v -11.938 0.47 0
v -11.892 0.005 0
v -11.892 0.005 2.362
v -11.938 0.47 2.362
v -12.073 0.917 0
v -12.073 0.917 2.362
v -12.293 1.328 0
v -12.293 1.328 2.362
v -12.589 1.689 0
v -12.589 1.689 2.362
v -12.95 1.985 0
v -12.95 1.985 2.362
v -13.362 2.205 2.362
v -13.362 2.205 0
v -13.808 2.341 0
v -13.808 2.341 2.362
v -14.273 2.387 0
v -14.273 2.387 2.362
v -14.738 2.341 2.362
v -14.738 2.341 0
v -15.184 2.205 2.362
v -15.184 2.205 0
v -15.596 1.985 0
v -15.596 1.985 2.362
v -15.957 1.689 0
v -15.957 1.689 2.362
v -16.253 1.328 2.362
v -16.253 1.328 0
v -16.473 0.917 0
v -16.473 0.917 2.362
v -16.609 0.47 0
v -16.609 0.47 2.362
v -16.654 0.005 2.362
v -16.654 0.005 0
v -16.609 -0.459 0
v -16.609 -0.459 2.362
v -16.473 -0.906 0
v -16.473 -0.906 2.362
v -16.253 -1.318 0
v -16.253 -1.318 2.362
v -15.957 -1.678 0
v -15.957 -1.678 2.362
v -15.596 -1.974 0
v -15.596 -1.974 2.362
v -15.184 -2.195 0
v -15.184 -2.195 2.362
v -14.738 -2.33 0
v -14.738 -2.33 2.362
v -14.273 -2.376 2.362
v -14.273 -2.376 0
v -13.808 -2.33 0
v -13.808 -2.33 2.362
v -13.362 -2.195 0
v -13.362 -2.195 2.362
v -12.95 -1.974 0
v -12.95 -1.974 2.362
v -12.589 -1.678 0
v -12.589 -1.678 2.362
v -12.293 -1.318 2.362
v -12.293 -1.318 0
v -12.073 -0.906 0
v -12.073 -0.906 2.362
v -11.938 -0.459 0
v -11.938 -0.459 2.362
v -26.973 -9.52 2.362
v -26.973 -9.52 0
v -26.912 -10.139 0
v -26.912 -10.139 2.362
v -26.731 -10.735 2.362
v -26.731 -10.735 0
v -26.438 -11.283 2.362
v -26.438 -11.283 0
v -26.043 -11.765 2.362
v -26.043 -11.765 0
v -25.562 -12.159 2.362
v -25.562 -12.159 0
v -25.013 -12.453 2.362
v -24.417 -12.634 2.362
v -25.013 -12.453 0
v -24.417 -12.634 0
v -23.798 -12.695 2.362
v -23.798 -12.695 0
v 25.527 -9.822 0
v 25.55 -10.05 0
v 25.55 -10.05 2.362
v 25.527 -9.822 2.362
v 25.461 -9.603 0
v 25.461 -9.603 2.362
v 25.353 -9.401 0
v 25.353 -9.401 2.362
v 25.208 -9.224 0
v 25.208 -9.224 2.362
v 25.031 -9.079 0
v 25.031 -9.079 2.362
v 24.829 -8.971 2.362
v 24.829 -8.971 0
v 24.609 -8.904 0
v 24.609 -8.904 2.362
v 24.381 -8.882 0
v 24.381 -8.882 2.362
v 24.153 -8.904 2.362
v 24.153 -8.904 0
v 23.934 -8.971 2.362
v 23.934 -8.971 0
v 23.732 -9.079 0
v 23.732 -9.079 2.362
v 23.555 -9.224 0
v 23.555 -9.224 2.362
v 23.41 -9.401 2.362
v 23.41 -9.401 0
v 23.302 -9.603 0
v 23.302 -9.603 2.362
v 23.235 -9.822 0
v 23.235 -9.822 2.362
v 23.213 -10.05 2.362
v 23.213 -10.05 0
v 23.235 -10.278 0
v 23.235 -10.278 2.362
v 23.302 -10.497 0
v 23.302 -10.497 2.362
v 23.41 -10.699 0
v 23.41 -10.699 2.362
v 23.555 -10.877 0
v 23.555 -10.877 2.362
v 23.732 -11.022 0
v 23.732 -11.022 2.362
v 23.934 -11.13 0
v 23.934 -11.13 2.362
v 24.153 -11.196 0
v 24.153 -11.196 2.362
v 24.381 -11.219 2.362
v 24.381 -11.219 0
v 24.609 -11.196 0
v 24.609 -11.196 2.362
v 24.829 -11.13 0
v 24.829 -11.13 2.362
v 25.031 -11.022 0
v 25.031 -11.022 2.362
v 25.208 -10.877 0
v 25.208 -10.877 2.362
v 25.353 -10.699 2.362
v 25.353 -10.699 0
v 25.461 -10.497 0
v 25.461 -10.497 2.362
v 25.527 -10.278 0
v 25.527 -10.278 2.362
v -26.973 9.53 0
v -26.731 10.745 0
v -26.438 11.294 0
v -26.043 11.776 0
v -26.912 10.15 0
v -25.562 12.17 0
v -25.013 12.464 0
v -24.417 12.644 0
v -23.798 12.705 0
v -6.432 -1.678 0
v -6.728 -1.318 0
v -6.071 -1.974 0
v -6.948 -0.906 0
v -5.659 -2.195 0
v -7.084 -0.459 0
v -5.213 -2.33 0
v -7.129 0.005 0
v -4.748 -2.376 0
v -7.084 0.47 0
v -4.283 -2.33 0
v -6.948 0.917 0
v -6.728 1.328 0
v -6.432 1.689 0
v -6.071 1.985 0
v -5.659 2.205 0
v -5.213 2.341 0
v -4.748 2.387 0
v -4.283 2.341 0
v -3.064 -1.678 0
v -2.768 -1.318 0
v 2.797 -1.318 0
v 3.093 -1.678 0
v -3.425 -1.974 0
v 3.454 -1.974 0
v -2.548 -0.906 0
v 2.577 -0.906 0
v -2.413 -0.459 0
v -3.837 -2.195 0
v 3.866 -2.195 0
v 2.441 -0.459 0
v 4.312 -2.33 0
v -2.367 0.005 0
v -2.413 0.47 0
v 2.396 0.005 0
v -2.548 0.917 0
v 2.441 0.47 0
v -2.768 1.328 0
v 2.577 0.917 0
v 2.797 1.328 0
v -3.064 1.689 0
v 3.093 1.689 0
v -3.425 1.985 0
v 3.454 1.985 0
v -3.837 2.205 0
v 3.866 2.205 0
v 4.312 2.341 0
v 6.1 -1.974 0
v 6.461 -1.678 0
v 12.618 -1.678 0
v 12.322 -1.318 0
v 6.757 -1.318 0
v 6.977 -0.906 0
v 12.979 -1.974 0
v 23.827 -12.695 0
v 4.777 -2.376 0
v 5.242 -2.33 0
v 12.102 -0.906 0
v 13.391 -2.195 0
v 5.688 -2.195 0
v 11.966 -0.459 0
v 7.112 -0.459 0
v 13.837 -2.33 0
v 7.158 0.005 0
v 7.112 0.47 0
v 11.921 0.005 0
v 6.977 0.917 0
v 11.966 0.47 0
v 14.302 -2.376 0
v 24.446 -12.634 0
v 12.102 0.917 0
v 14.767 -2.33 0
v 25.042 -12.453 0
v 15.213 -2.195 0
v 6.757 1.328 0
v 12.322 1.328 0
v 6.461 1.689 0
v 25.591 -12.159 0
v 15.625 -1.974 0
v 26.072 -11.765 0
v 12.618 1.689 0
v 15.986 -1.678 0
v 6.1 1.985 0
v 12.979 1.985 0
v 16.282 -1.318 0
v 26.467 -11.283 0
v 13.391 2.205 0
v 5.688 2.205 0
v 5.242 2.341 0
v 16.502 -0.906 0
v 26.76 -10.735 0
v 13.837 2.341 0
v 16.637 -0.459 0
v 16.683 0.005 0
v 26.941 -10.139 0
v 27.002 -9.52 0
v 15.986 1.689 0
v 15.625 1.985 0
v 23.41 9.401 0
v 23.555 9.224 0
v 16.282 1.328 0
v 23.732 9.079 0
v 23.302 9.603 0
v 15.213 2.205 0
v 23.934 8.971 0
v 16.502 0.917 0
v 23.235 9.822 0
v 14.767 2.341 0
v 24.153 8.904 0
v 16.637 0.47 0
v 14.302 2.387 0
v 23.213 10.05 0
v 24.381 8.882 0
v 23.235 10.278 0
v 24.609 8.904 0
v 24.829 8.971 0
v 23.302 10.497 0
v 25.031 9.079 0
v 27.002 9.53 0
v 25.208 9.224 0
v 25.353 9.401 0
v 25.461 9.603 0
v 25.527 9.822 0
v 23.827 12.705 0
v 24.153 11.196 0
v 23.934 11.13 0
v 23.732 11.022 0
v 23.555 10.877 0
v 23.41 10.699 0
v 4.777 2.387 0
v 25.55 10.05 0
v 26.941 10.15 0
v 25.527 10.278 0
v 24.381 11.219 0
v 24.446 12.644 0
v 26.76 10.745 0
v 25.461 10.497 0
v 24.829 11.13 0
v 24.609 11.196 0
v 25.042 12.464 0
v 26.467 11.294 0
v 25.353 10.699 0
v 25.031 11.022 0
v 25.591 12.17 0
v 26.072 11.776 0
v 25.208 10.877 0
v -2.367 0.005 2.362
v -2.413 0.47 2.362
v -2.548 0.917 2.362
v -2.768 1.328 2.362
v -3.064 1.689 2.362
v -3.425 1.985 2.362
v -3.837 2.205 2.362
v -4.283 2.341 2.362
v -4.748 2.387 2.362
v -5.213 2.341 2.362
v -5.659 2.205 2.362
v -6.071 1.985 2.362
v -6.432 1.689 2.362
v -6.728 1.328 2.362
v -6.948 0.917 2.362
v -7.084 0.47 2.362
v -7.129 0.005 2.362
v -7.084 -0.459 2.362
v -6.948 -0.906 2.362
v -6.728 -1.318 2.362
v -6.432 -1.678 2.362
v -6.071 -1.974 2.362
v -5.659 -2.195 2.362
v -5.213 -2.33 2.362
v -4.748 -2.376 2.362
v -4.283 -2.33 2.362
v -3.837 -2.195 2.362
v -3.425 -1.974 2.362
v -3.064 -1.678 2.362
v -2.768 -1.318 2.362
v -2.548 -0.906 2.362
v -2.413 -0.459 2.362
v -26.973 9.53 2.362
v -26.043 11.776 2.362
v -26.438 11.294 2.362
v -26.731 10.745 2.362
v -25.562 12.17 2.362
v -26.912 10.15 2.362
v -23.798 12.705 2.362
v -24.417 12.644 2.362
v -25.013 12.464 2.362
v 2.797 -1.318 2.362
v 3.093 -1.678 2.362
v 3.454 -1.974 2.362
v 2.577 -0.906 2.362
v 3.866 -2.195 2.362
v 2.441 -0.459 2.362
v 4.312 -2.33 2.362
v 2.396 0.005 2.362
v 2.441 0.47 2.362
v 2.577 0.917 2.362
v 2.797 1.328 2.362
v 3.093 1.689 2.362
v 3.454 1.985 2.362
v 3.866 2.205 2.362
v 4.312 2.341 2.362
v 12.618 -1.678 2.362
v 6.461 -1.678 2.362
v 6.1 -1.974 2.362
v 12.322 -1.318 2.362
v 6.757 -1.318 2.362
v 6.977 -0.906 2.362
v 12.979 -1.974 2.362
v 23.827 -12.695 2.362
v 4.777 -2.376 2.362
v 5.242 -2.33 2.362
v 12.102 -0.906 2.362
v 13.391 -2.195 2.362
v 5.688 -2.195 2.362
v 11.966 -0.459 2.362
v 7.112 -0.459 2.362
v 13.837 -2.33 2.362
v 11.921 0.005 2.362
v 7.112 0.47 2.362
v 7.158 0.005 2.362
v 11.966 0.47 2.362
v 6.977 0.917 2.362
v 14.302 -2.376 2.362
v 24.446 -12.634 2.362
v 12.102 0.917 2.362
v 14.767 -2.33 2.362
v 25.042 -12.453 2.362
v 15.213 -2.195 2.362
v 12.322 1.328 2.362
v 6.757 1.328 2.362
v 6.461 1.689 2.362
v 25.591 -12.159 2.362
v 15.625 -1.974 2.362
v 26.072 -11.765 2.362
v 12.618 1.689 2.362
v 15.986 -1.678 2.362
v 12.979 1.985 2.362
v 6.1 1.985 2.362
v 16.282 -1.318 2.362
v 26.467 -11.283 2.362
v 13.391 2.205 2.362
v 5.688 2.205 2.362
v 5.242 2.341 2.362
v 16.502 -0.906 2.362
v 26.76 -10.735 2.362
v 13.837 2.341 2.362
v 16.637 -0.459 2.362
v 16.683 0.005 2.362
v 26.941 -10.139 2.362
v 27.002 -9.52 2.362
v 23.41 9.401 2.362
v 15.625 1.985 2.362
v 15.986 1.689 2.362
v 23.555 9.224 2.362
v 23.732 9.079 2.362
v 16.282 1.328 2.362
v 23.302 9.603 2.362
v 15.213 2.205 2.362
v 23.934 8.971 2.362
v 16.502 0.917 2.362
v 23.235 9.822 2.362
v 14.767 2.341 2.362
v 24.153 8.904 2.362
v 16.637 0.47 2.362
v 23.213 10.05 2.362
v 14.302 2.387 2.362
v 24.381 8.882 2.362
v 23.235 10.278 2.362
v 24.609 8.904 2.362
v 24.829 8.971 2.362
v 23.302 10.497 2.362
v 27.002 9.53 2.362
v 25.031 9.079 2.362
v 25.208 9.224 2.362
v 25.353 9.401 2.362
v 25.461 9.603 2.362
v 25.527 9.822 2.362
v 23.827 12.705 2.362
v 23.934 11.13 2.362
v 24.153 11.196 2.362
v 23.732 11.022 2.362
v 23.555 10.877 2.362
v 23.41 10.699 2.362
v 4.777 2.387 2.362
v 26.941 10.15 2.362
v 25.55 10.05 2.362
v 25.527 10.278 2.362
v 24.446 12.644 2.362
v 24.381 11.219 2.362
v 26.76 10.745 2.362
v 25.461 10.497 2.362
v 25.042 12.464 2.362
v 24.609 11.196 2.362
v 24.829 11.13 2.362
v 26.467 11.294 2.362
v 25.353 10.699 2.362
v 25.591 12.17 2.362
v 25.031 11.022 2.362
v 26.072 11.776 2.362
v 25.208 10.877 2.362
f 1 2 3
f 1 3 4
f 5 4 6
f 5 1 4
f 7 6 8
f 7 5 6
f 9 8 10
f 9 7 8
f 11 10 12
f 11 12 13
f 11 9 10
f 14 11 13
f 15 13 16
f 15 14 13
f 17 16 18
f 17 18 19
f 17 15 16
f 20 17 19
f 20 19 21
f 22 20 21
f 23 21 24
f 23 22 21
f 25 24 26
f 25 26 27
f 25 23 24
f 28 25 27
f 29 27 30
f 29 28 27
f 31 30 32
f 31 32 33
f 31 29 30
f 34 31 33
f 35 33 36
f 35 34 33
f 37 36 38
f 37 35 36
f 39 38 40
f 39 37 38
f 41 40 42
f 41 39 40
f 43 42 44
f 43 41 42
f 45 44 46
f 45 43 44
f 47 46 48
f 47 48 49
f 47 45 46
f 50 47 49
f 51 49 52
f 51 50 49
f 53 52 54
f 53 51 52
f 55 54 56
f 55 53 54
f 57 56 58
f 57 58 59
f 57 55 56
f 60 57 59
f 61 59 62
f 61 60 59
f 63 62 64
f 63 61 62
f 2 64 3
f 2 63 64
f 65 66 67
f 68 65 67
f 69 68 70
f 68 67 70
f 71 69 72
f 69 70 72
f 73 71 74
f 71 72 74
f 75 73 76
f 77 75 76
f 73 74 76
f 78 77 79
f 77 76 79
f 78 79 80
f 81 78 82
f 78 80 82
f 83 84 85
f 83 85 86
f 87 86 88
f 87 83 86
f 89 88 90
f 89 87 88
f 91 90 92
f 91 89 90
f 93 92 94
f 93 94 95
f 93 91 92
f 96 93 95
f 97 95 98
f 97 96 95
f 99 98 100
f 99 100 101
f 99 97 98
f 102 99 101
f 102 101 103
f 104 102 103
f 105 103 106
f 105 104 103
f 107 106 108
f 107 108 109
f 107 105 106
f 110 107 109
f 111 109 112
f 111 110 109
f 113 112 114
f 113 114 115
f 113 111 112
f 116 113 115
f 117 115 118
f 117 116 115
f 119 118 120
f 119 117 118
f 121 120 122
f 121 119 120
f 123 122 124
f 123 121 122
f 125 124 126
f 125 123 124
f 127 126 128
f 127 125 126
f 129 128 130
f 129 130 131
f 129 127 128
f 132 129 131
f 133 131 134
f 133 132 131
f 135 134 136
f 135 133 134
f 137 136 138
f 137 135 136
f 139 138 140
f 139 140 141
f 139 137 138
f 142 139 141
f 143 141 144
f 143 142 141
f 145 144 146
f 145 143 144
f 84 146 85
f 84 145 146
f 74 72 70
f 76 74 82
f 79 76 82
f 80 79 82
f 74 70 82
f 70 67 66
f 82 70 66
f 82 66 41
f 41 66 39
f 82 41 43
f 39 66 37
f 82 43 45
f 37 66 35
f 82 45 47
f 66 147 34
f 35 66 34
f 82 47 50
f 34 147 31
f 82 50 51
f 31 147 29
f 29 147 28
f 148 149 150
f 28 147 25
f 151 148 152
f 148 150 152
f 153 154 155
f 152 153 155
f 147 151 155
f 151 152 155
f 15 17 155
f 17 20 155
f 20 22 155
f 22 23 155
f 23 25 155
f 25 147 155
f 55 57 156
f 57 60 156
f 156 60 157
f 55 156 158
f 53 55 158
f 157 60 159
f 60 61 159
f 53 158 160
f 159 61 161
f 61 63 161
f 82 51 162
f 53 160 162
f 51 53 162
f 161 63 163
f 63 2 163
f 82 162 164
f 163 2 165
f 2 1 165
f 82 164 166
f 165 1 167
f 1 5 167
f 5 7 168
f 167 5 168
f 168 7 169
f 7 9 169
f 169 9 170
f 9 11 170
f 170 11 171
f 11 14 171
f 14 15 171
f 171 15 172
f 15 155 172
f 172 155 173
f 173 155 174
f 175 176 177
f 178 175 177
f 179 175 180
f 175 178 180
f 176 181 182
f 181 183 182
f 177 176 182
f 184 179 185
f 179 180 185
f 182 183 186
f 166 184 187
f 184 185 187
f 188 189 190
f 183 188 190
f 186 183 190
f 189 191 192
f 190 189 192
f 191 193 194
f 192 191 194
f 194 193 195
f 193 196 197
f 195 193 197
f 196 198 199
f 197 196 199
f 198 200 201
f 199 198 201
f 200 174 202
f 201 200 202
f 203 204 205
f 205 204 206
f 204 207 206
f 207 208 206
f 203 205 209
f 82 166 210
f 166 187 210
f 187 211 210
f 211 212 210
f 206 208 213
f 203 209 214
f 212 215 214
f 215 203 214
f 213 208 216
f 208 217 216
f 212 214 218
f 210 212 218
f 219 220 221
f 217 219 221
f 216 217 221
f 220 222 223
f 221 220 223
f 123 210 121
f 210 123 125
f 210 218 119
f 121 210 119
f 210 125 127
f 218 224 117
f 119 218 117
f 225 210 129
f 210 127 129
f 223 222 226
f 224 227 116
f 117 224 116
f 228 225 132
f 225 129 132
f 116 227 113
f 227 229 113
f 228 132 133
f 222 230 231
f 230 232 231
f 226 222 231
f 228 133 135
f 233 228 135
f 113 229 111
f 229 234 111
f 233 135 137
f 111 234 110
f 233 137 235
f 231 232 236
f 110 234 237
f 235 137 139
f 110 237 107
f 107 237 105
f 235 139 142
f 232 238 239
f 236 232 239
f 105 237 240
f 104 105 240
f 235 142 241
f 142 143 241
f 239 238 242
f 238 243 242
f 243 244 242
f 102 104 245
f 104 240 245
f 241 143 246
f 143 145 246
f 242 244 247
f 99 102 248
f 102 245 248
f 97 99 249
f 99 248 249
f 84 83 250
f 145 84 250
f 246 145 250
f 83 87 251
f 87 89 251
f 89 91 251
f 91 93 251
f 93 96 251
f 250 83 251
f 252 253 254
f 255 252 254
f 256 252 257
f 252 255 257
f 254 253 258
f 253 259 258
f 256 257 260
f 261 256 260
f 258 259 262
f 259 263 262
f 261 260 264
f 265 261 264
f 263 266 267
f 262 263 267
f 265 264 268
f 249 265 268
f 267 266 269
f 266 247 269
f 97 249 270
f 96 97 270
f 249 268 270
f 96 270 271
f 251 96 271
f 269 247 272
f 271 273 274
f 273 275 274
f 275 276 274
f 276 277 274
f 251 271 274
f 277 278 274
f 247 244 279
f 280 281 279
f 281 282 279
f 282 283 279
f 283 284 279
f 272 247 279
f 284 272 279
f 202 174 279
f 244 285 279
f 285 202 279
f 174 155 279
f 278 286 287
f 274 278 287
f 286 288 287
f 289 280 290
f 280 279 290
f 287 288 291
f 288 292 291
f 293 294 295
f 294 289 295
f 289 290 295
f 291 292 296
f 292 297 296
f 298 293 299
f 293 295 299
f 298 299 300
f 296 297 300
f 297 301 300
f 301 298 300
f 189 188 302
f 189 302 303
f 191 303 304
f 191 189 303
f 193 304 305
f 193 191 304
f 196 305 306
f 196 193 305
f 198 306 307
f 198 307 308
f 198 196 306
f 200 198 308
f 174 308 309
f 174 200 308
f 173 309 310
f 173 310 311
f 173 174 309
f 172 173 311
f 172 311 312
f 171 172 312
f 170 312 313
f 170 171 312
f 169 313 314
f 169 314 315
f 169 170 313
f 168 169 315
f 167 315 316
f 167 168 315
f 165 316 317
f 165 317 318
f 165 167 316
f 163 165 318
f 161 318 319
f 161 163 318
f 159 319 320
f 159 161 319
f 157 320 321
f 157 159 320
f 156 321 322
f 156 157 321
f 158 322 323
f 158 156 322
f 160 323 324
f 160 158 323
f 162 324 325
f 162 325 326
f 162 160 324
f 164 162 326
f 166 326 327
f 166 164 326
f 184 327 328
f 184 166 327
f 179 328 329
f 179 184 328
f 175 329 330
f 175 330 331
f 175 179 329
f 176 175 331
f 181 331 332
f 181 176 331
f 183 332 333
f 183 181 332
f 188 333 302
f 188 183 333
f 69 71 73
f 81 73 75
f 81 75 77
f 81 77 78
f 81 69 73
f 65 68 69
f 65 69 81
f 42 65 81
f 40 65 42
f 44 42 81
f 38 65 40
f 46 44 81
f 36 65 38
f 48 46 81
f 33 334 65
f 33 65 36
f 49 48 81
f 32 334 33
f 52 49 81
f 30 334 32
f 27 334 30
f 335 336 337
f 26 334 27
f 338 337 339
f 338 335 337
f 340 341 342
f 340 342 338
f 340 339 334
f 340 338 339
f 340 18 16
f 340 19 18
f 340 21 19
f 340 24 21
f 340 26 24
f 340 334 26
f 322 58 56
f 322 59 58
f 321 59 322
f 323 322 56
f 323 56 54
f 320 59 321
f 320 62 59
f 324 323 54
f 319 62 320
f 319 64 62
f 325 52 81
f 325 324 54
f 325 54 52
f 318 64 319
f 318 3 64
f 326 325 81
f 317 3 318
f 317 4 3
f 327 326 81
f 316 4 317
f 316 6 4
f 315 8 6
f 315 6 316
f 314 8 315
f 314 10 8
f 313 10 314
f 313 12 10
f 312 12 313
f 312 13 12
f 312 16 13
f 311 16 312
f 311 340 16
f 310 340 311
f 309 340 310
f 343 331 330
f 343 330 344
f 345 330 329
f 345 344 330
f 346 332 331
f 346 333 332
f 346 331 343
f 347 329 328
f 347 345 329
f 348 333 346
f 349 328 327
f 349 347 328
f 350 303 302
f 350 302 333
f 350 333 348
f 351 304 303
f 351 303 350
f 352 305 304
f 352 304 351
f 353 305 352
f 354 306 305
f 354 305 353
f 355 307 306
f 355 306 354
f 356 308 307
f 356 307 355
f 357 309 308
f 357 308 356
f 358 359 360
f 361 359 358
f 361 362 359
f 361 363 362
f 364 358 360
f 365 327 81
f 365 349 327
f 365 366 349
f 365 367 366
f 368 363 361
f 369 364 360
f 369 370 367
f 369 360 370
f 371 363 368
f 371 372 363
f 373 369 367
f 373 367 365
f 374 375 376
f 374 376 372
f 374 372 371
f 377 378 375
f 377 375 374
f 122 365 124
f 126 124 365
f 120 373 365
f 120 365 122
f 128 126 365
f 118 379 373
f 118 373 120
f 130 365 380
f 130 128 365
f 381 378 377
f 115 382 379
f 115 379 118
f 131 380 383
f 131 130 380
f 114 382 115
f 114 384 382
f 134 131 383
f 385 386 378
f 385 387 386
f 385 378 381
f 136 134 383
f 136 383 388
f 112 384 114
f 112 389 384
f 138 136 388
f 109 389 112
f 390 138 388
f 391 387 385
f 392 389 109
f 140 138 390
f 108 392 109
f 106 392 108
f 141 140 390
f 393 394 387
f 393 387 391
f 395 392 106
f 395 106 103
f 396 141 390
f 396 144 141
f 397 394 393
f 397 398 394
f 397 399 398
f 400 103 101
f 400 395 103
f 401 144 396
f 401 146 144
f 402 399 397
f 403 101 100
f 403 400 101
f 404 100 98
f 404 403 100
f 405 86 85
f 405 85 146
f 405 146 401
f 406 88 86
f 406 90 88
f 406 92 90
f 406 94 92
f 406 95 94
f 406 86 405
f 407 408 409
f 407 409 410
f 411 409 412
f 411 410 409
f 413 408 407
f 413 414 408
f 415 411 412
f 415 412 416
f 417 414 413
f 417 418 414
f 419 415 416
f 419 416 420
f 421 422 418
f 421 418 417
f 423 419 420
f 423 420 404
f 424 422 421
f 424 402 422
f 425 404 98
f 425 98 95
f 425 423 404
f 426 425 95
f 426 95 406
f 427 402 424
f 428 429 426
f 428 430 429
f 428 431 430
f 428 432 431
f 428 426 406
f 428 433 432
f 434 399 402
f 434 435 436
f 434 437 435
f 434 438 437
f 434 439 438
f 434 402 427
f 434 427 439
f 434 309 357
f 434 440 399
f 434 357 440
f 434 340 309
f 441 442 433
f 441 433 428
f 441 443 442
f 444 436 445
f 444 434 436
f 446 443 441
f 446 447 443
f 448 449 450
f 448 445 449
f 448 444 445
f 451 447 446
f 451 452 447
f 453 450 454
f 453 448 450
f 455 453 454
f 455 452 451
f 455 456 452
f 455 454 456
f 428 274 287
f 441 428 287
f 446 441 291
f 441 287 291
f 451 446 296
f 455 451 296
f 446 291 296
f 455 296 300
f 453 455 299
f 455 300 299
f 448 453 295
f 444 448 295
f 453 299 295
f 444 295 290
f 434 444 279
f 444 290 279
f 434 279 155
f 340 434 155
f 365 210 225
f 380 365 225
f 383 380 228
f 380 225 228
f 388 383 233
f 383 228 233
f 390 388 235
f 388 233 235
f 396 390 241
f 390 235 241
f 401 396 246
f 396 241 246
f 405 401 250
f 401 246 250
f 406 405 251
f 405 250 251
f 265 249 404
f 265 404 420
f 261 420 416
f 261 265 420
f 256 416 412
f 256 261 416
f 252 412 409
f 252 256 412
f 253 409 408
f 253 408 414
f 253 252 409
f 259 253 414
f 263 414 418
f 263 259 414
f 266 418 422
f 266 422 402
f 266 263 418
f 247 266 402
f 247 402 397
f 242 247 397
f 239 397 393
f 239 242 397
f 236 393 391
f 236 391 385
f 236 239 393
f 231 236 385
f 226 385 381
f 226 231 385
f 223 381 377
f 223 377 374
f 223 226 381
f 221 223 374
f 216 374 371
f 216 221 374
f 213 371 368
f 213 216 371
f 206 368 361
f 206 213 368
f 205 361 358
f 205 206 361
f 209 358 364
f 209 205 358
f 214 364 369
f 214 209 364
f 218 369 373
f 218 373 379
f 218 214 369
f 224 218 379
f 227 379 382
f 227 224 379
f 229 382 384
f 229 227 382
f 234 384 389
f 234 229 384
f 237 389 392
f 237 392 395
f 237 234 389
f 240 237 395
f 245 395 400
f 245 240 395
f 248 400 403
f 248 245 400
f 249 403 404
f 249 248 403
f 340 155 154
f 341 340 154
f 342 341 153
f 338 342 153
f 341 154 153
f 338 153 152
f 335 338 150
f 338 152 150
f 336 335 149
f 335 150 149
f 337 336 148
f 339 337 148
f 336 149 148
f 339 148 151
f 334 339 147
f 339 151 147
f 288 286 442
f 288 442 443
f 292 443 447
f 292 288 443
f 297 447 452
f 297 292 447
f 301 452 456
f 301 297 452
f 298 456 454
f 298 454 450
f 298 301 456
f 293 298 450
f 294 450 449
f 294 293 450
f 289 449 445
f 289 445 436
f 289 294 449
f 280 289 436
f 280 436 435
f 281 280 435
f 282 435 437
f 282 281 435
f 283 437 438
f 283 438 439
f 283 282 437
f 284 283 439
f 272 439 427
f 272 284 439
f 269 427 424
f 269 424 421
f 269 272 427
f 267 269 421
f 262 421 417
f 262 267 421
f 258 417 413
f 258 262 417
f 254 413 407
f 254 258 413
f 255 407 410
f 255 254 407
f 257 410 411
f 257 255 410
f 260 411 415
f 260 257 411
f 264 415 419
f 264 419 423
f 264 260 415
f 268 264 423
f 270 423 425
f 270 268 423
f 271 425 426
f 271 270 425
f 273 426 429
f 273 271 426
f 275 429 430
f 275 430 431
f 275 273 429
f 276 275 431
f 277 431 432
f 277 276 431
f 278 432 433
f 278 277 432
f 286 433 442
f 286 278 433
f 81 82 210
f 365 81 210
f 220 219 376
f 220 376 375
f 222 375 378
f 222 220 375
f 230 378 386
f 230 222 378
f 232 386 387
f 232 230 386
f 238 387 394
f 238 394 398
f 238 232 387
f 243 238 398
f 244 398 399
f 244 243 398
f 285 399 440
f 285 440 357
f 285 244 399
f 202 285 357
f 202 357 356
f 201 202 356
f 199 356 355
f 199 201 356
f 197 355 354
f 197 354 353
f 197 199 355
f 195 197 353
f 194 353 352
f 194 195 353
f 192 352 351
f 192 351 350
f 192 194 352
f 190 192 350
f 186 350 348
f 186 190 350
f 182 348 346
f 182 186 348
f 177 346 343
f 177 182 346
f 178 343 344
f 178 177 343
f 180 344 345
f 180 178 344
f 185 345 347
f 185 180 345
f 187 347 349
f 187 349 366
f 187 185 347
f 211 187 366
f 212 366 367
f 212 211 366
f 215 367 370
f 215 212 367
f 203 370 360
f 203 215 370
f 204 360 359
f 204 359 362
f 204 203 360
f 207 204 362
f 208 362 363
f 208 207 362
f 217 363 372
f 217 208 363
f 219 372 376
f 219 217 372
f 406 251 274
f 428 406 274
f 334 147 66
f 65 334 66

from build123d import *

# Parameters (mm, degrees)
F0_R     = 2.38125
F0_R_2   = 1.1684
F1_DEPTH = 2.3622


with BuildPart() as f1:
    # F0 (on Top) → F1 (new body)
    with BuildSketch(Plane.XY):
        with BuildLine():
            ThreePointArc((27.001965, 9.530442), (26.072029, 11.775506), (23.826965, 12.705442))
            Line((23.826965, 12.705442), (-23.798035, 12.705442))
            ThreePointArc((-23.798035, 12.705442), (-26.043099, 11.775506), (-26.973035, 9.530442))
            Line((-26.973035, 9.530442), (-26.973035, -9.519558))
            ThreePointArc((-26.973035, -9.519558), (-26.043099, -11.764622), (-23.798035, -12.694558))
            Line((-23.798035, -12.694558), (23.826965, -12.694558))
            ThreePointArc((23.826965, -12.694558), (26.072029, -11.764622), (27.001965, -9.519558))
            Line((27.001965, -9.519558), (27.001965, 9.530442))
        make_face()
        with Locations((-14.273035, 0.005442)):
            Circle(F0_R, mode=Mode.SUBTRACT)
        with Locations((-4.748035, 0.005442)):
            Circle(F0_R, mode=Mode.SUBTRACT)
        with Locations((24.38142, -10.050331)):
            Circle(F0_R_2, mode=Mode.SUBTRACT)
        with Locations((4.776965, 0.005442)):
            Circle(F0_R, mode=Mode.SUBTRACT)
        with Locations((14.301965, 0.005442)):
            Circle(F0_R, mode=Mode.SUBTRACT)
        with Locations((24.38142, 10.050331)):
            Circle(F0_R_2, mode=Mode.SUBTRACT)
    extrude(amount=F1_DEPTH)


solid = f1.part
